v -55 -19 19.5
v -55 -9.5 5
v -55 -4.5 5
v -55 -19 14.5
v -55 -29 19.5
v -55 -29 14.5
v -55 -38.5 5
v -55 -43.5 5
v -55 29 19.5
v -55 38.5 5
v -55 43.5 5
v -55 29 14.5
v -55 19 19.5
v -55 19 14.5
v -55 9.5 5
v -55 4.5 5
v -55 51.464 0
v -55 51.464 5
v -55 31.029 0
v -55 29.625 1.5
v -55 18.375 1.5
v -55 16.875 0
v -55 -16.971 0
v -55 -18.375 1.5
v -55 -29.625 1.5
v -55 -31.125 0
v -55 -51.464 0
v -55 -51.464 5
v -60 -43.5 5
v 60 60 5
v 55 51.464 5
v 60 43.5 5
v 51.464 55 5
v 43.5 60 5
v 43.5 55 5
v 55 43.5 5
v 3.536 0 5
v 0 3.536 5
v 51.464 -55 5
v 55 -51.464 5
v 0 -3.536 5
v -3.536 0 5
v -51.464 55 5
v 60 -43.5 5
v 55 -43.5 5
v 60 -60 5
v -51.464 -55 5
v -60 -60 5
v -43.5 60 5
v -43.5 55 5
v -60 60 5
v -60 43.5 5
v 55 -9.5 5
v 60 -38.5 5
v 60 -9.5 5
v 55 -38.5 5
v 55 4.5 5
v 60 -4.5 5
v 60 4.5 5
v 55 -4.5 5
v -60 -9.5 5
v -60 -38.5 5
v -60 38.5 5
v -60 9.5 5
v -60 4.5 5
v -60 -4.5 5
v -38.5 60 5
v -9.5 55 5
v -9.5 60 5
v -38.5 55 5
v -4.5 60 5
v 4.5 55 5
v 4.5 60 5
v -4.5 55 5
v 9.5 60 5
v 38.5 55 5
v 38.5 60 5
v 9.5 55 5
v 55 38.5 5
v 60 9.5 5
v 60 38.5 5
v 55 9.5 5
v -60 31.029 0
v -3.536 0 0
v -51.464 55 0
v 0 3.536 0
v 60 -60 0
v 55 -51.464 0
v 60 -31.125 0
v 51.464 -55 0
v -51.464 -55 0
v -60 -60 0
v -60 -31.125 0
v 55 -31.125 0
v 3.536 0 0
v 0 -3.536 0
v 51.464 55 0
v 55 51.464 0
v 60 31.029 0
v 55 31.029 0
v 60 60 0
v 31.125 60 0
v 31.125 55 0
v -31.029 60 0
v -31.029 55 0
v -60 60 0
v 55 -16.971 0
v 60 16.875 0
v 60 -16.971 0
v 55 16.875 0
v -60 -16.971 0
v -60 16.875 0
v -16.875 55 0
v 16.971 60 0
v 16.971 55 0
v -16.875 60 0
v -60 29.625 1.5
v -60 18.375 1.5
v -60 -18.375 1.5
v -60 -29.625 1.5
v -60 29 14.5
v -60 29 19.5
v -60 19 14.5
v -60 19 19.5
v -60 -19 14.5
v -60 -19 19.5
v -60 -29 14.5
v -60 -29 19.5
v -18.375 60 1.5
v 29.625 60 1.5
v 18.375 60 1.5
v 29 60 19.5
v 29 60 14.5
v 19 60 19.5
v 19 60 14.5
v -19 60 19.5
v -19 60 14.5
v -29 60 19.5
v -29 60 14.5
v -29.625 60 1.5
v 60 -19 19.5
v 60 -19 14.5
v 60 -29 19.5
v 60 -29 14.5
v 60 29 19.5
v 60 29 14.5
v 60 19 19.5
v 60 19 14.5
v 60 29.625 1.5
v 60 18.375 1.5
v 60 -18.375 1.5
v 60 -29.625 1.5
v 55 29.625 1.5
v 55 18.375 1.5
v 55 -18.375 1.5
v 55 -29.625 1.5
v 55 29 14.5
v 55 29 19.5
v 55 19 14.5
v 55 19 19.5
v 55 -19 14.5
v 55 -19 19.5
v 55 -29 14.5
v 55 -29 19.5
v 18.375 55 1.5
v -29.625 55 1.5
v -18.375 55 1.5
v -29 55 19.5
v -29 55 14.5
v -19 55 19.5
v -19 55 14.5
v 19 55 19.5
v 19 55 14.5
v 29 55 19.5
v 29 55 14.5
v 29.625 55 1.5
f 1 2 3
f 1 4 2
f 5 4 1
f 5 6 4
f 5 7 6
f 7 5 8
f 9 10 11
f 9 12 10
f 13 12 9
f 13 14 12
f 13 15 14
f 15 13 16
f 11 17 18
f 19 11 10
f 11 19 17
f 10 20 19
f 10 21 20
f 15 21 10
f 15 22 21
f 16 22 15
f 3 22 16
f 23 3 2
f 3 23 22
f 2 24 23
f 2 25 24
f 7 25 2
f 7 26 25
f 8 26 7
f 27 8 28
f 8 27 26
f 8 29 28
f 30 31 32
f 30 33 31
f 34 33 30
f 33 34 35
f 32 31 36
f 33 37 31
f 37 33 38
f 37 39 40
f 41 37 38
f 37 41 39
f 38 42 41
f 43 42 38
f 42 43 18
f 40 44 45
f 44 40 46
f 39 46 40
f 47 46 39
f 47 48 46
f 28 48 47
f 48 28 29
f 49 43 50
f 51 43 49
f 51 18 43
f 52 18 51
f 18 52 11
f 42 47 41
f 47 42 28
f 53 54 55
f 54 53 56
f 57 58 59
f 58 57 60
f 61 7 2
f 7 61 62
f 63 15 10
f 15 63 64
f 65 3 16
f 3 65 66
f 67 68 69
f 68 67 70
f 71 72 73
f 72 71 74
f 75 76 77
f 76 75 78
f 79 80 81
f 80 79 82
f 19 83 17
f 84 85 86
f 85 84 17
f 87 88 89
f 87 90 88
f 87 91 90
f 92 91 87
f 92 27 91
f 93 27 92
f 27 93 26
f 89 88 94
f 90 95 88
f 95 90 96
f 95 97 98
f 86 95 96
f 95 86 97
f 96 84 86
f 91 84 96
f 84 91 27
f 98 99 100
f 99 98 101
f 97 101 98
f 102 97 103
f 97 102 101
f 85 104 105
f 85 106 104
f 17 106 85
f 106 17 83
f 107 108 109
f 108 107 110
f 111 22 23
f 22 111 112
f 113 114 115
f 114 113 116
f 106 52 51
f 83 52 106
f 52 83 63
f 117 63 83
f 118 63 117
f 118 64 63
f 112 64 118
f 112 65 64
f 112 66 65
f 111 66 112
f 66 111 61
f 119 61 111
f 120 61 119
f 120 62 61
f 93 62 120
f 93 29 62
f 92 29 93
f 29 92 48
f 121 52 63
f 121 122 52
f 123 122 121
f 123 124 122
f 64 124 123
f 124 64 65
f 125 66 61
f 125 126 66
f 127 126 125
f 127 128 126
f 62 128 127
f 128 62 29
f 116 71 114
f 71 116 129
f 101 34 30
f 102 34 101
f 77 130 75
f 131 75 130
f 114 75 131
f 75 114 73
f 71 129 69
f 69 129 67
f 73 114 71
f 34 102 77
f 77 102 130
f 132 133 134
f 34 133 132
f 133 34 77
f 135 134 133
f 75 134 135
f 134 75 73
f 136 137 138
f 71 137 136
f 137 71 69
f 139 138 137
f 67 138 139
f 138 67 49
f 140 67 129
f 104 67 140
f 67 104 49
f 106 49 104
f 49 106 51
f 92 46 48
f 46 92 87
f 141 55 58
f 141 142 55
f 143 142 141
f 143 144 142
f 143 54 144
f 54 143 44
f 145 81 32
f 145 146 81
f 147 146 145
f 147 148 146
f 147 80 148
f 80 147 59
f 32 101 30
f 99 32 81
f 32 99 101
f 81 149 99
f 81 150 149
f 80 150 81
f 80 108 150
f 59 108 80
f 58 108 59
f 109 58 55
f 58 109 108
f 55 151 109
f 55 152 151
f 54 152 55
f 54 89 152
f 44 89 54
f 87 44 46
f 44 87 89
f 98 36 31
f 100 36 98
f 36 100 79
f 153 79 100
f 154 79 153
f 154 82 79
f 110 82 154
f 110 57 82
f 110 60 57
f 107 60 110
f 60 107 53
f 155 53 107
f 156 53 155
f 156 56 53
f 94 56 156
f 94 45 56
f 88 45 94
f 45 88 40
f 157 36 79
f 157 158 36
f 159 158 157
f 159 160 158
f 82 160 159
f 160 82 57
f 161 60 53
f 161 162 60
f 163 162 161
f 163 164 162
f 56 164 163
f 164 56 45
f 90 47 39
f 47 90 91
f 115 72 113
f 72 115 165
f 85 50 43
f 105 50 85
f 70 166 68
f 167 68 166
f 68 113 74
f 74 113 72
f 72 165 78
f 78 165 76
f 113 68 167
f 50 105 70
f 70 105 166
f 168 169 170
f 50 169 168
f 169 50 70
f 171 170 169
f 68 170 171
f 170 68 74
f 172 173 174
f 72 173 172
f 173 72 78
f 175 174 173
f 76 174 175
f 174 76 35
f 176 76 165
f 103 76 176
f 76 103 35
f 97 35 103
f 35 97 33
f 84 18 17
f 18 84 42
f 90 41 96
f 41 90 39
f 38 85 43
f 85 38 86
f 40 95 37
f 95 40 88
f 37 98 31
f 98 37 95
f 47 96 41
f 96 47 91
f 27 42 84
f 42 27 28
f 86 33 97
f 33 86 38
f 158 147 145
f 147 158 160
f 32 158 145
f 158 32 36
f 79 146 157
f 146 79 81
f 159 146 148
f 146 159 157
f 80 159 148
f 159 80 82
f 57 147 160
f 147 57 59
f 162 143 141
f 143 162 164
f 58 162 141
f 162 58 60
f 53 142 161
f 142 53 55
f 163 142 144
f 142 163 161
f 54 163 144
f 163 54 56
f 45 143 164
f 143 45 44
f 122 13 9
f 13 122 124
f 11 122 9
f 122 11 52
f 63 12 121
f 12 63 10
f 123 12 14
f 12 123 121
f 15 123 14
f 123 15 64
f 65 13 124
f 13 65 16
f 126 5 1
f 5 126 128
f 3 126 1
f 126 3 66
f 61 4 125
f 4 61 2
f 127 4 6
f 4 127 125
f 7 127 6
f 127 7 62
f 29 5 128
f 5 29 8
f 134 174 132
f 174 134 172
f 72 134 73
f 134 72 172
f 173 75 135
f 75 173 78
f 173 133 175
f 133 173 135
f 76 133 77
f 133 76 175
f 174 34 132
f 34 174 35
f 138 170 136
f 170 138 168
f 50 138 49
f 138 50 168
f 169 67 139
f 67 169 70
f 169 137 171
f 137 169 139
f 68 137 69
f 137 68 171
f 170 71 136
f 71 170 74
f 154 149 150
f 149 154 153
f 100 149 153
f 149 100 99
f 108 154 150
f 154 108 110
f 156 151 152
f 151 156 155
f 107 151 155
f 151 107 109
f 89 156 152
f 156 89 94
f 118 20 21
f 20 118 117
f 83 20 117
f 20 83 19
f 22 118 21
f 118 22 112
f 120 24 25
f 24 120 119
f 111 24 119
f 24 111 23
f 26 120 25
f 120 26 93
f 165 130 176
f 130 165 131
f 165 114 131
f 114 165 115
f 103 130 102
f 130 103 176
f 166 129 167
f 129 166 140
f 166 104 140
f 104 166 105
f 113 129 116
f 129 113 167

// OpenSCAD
$fn=64;
difference(){union(){translate(v = [-57.5, 0])
translate(v = [-2.5, -60.0])
cube(size = [5, 120, 5]);
translate(v = [57.5, 0])
translate(v = [-2.5, -60.0])
cube(size = [5, 120, 5]);
translate(v = [0, -57.5])
rotate(a = [0, 0, 90])
translate(v = [-2.5, -60.0])
cube(size = [5, 120, 5]);
translate(v = [0, 57.5])
rotate(a = [0, 0, 90])
translate(v = [-2.5, -60.0])
cube(size = [5, 120, 5]);
rotate(a = [0, 0, 45])
translate(v = [-2.5, -77.78174593052023])
cube(size = [5, 155.56349186104046, 5]);
rotate(a = [0, 0, -45])
translate(v = [-2.5, -77.78174593052023])
cube(size = [5, 155.56349186104046, 5]);
translate(v = [57.5, 24.0])
union(){translate(v = [0, 0, 0.0])
translate(v = [2.5, -24.5])
rotate(a = [0, -90, 0])
linear_extrude(height = 5){polygon(points = [[0, 0], [19.5, 19.5], [19.5, 29.5], [0, 49.0], [0, 44.0], [14.5, 29.5], [14.5, 19.5], [0, 5], [0, 0]]);
}
}
translate(v = [57.5, -24.0])
union(){translate(v = [0, 0, 0.0])
translate(v = [2.5, -24.5])
rotate(a = [0, -90, 0])
linear_extrude(height = 5){polygon(points = [[0, 0], [19.5, 19.5], [19.5, 29.5], [0, 49.0], [0, 44.0], [14.5, 29.5], [14.5, 19.5], [0, 5], [0, 0]]);
}
}
translate(v = [-57.5, 24.0])
union(){translate(v = [0, 0, 0.0])
translate(v = [2.5, -24.5])
rotate(a = [0, -90, 0])
linear_extrude(height = 5){polygon(points = [[0, 0], [19.5, 19.5], [19.5, 29.5], [0, 49.0], [0, 44.0], [14.5, 29.5], [14.5, 19.5], [0, 5], [0, 0]]);
}
}
translate(v = [-57.5, -24.0])
union(){translate(v = [0, 0, 0.0])
translate(v = [2.5, -24.5])
rotate(a = [0, -90, 0])
linear_extrude(height = 5){polygon(points = [[0, 0], [19.5, 19.5], [19.5, 29.5], [0, 49.0], [0, 44.0], [14.5, 29.5], [14.5, 19.5], [0, 5], [0, 0]]);
}
}
translate(v = [24.0, 57.5])
rotate(a = [0, 0, 90])
union(){translate(v = [0, 0, 0.0])
translate(v = [2.5, -24.5])
rotate(a = [0, -90, 0])
linear_extrude(height = 5){polygon(points = [[0, 0], [19.5, 19.5], [19.5, 29.5], [0, 49.0], [0, 44.0], [14.5, 29.5], [14.5, 19.5], [0, 5], [0, 0]]);
}
}
translate(v = [-24.0, 57.5])
rotate(a = [0, 0, 90])
union(){translate(v = [0, 0, 0.0])
translate(v = [2.5, -24.5])
rotate(a = [0, -90, 0])
linear_extrude(height = 5){polygon(points = [[0, 0], [19.5, 19.5], [19.5, 29.5], [0, 49.0], [0, 44.0], [14.5, 29.5], [14.5, 19.5], [0, 5], [0, 0]]);
}
}
}
translate(v = [57.5, 24.0, -18])
union(){translate(v = [0, 0, 0.0])
translate(v = [3.5, -25.125])
rotate(a = [0, -90, 0])
linear_extrude(height = 7){polygon(points = [[0, 0], [19.5, 19.5], [19.5, 30.75], [0, 49.0], [0, 44.0], [14.5, 30.75], [14.5, 19.5], [0, 5], [0, 0]]);
}
}
translate(v = [57.5, -24.0, -18])
union(){translate(v = [0, 0, 0.0])
translate(v = [3.5, -25.125])
rotate(a = [0, -90, 0])
linear_extrude(height = 7){polygon(points = [[0, 0], [19.5, 19.5], [19.5, 30.75], [0, 49.0], [0, 44.0], [14.5, 30.75], [14.5, 19.5], [0, 5], [0, 0]]);
}
}
translate(v = [-57.5, 24.0, -18])
union(){translate(v = [0, 0, 0.0])
translate(v = [3.5, -25.125])
rotate(a = [0, -90, 0])
linear_extrude(height = 7){polygon(points = [[0, 0], [19.5, 19.5], [19.5, 30.75], [0, 49.0], [0, 44.0], [14.5, 30.75], [14.5, 19.5], [0, 5], [0, 0]]);
}
}
translate(v = [-57.5, -24.0, -18])
union(){translate(v = [0, 0, 0.0])
translate(v = [3.5, -25.125])
rotate(a = [0, -90, 0])
linear_extrude(height = 7){polygon(points = [[0, 0], [19.5, 19.5], [19.5, 30.75], [0, 49.0], [0, 44.0], [14.5, 30.75], [14.5, 19.5], [0, 5], [0, 0]]);
}
}
translate(v = [24.0, 57.5, -18])
rotate(a = [0, 0, 90])
union(){translate(v = [0, 0, 0.0])
translate(v = [3.5, -25.125])
rotate(a = [0, -90, 0])
linear_extrude(height = 7){polygon(points = [[0, 0], [19.5, 19.5], [19.5, 30.75], [0, 49.0], [0, 44.0], [14.5, 30.75], [14.5, 19.5], [0, 5], [0, 0]]);
}
}
translate(v = [-24.0, 57.5, -18])
rotate(a = [0, 0, 90])
union(){translate(v = [0, 0, 0.0])
translate(v = [3.5, -25.125])
rotate(a = [0, -90, 0])
linear_extrude(height = 7){polygon(points = [[0, 0], [19.5, 19.5], [19.5, 30.75], [0, 49.0], [0, 44.0], [14.5, 30.75], [14.5, 19.5], [0, 5], [0, 0]]);
}
}
}
